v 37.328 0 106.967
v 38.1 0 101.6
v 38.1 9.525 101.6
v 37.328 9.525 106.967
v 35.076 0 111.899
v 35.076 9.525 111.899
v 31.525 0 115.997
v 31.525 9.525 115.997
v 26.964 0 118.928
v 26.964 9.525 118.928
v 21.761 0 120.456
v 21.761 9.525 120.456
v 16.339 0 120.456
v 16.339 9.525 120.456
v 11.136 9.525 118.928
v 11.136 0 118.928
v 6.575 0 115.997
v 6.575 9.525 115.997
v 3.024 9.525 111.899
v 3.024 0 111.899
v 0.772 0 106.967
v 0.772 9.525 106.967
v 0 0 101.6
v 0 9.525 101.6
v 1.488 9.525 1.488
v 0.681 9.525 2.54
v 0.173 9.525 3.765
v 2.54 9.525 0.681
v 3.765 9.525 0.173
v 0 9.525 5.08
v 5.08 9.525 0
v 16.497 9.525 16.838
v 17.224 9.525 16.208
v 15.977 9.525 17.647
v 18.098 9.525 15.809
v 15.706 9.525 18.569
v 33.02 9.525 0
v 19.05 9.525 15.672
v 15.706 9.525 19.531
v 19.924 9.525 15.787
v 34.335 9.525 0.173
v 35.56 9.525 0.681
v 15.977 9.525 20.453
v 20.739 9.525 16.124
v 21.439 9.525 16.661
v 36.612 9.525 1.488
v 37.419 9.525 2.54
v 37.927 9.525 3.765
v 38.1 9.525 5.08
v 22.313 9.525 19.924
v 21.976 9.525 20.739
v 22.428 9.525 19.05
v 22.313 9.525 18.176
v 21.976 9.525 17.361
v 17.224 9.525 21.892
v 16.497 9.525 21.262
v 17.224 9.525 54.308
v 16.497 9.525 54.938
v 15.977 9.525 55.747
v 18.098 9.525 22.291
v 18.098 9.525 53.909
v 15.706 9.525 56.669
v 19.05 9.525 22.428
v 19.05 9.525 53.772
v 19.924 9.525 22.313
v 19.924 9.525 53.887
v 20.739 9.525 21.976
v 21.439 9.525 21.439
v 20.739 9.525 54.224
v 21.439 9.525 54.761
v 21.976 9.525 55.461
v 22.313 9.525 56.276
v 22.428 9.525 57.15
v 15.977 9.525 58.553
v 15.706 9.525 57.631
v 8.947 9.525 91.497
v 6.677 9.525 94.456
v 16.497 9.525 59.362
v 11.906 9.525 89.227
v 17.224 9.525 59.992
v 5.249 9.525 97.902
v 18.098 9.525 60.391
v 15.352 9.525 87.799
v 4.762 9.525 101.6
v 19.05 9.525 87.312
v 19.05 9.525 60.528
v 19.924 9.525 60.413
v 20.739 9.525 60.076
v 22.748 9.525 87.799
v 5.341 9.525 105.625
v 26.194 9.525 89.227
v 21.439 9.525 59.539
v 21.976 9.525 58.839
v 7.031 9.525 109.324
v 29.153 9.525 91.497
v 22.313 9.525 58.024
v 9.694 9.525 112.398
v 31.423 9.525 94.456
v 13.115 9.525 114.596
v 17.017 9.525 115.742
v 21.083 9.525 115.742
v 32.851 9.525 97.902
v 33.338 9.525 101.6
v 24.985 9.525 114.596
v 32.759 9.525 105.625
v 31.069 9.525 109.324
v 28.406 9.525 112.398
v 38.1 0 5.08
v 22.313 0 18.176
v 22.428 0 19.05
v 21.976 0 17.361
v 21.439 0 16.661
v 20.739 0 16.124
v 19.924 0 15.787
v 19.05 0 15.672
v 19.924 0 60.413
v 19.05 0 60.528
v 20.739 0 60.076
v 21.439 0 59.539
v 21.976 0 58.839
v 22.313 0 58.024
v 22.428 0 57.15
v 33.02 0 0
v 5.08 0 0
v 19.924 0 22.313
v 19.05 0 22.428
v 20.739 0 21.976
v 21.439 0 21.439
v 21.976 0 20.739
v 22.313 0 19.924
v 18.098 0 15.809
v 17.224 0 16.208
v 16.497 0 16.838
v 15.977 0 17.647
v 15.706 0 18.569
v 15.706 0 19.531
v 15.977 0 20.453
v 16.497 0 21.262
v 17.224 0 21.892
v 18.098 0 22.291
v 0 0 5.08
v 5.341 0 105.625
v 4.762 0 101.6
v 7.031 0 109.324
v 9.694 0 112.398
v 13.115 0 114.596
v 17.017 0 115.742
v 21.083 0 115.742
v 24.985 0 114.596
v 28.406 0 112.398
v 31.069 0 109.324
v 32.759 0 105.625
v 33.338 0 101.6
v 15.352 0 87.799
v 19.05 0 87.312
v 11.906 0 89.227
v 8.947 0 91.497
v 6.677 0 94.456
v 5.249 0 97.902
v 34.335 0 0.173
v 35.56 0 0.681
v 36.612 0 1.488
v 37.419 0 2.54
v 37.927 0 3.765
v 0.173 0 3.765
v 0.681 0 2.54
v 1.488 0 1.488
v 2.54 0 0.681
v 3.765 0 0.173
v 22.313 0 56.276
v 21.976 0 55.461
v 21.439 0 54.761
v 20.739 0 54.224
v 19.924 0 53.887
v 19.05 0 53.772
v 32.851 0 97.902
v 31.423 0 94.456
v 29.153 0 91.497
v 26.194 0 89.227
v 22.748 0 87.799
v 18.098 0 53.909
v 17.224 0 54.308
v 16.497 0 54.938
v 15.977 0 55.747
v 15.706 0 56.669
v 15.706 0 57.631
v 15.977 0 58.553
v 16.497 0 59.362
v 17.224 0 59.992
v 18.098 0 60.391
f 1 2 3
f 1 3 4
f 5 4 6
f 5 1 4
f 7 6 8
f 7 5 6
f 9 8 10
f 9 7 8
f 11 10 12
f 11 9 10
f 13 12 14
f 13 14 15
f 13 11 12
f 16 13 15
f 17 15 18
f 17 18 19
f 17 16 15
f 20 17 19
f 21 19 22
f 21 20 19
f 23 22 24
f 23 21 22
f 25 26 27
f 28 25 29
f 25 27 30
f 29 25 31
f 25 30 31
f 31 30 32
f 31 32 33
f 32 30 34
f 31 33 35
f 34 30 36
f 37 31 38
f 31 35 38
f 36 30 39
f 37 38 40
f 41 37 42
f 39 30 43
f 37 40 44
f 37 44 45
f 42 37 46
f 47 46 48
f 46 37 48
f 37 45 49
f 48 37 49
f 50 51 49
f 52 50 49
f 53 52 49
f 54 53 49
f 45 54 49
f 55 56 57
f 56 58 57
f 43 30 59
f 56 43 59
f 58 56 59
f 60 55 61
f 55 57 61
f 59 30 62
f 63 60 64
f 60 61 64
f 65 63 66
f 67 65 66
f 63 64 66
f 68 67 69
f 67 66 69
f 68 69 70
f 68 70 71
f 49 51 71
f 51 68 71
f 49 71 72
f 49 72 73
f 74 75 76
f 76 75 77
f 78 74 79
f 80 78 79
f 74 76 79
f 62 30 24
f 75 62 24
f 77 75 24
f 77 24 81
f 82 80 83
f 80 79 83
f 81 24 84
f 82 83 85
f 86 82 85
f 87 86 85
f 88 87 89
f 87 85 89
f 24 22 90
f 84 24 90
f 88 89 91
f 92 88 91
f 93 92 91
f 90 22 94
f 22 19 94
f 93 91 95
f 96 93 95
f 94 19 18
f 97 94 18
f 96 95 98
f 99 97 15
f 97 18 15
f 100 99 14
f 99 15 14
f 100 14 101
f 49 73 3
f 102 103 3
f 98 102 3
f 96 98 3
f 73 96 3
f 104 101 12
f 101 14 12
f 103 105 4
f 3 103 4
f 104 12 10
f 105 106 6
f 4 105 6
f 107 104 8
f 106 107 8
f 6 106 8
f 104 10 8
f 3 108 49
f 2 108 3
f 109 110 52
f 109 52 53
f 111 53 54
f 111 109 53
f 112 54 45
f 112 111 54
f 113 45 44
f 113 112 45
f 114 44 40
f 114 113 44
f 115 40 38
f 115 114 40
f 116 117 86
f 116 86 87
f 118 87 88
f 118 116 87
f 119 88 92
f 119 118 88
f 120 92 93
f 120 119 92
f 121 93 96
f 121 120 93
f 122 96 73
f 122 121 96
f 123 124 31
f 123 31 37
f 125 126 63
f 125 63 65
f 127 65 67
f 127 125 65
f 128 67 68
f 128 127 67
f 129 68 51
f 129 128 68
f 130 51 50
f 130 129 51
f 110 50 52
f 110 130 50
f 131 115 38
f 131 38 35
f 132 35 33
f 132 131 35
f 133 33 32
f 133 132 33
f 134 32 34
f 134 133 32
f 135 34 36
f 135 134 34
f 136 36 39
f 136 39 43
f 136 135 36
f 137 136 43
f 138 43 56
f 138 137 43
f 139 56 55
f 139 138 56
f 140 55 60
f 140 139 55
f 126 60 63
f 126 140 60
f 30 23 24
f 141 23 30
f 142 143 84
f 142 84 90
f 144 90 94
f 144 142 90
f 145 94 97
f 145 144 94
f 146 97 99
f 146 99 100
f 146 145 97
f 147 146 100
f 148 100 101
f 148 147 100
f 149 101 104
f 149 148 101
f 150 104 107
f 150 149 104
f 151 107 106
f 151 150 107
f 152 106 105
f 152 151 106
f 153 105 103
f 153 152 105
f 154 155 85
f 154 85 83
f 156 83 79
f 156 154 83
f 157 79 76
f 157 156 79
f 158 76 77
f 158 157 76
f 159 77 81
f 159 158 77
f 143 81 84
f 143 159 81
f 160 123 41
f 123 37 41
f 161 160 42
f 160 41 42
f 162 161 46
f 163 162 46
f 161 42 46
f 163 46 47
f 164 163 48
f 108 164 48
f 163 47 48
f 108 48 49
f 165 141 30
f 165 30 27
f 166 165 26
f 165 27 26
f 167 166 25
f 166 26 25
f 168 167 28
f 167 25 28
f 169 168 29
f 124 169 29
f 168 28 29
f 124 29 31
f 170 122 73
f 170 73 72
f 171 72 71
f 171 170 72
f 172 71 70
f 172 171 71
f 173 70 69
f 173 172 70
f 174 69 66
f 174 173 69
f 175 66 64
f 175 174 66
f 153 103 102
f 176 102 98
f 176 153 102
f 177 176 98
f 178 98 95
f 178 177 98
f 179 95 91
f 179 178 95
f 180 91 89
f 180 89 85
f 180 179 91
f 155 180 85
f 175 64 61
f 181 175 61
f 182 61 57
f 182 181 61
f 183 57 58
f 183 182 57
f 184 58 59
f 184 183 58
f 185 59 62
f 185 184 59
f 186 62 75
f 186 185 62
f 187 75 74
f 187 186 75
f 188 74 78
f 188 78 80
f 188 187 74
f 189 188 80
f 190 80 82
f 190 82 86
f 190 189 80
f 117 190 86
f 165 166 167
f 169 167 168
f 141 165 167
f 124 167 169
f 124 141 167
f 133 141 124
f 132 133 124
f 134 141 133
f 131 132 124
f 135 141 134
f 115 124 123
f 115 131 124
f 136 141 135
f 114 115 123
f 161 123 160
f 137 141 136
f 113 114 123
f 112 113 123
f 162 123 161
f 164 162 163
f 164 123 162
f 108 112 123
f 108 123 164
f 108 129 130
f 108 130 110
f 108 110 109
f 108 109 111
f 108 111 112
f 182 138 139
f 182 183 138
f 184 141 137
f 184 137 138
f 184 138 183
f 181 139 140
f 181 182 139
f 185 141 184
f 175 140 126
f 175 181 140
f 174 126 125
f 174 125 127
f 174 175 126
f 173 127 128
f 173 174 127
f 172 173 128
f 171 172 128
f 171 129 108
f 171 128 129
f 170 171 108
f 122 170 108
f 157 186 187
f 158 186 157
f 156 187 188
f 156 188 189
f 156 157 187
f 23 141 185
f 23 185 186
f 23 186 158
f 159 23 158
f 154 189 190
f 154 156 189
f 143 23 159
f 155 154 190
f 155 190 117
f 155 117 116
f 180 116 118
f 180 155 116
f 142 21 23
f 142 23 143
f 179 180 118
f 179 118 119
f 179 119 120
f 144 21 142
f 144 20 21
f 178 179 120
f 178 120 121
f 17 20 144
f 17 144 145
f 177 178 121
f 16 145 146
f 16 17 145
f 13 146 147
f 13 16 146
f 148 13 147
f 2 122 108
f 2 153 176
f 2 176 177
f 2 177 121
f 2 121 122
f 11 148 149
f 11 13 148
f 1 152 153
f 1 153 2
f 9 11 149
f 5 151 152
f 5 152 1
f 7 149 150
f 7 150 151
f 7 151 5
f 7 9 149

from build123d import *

# Parameters (mm, degrees)
F1_DEPTH = 9.525
F3_R     = 5.08


with BuildPart() as f1:
    # F0 (on Front) → F1 (new body)
    with BuildSketch(Plane.XZ):
        with BuildLine():
            Line((0, 101.6), (0, 0))
            Line((0, 0), (19.05, 0))
            Line((19.05, 0), (19.05, 15.6718))
            ThreePointArc((19.05, 15.6718), (15.6718, 19.05), (19.05, 22.4282))
            Line((19.05, 22.4282), (19.05, 53.7718))
            ThreePointArc((19.05, 53.7718), (15.6718, 57.15), (19.05, 60.5282))
            Line((19.05, 60.5282), (19.05, 87.3125))
            ThreePointArc((19.05, 87.3125), (8.947212, 91.497212), (4.7625, 101.6))
            Line((4.7625, 101.6), (0, 101.6))
        make_face()
        with BuildLine():
            Line((19.05, 15.6718), (19.05, 0))
            Line((19.05, 0), (38.1, 0))
            Line((38.1, 0), (38.1, 101.6))
            Line((38.1, 101.6), (33.3375, 101.6))
            ThreePointArc((33.3375, 101.6), (29.152788, 91.497212), (19.05, 87.3125))
            Line((19.05, 87.3125), (19.05, 60.5282))
            ThreePointArc((19.05, 60.5282), (21.438748, 59.538748), (22.4282, 57.15))
            ThreePointArc((22.4282, 57.15), (21.438748, 54.761252), (19.05, 53.7718))
            Line((19.05, 53.7718), (19.05, 22.4282))
            ThreePointArc((19.05, 22.4282), (21.438748, 21.438748), (22.4282, 19.05))
            ThreePointArc((22.4282, 19.05), (21.438748, 16.661252), (19.05, 15.6718))
        make_face()
        with BuildLine():
            ThreePointArc((38.1, 101.6), (19.05, 120.65), (0, 101.6))
            Line((0, 101.6), (4.7625, 101.6))
            ThreePointArc((4.7625, 101.6), (19.05, 115.8875), (33.3375, 101.6))
            Line((33.3375, 101.6), (38.1, 101.6))
        make_face()
    extrude(amount=-F1_DEPTH)

    # F3
    f3_edges = [f1.edges().sort_by_distance(p)[0] for p in [
        (38.1, 4.7625, 0),
        (0, 4.7625, 0),
    ]]
    fillet(f3_edges, radius=F3_R)


solid = f1.part
